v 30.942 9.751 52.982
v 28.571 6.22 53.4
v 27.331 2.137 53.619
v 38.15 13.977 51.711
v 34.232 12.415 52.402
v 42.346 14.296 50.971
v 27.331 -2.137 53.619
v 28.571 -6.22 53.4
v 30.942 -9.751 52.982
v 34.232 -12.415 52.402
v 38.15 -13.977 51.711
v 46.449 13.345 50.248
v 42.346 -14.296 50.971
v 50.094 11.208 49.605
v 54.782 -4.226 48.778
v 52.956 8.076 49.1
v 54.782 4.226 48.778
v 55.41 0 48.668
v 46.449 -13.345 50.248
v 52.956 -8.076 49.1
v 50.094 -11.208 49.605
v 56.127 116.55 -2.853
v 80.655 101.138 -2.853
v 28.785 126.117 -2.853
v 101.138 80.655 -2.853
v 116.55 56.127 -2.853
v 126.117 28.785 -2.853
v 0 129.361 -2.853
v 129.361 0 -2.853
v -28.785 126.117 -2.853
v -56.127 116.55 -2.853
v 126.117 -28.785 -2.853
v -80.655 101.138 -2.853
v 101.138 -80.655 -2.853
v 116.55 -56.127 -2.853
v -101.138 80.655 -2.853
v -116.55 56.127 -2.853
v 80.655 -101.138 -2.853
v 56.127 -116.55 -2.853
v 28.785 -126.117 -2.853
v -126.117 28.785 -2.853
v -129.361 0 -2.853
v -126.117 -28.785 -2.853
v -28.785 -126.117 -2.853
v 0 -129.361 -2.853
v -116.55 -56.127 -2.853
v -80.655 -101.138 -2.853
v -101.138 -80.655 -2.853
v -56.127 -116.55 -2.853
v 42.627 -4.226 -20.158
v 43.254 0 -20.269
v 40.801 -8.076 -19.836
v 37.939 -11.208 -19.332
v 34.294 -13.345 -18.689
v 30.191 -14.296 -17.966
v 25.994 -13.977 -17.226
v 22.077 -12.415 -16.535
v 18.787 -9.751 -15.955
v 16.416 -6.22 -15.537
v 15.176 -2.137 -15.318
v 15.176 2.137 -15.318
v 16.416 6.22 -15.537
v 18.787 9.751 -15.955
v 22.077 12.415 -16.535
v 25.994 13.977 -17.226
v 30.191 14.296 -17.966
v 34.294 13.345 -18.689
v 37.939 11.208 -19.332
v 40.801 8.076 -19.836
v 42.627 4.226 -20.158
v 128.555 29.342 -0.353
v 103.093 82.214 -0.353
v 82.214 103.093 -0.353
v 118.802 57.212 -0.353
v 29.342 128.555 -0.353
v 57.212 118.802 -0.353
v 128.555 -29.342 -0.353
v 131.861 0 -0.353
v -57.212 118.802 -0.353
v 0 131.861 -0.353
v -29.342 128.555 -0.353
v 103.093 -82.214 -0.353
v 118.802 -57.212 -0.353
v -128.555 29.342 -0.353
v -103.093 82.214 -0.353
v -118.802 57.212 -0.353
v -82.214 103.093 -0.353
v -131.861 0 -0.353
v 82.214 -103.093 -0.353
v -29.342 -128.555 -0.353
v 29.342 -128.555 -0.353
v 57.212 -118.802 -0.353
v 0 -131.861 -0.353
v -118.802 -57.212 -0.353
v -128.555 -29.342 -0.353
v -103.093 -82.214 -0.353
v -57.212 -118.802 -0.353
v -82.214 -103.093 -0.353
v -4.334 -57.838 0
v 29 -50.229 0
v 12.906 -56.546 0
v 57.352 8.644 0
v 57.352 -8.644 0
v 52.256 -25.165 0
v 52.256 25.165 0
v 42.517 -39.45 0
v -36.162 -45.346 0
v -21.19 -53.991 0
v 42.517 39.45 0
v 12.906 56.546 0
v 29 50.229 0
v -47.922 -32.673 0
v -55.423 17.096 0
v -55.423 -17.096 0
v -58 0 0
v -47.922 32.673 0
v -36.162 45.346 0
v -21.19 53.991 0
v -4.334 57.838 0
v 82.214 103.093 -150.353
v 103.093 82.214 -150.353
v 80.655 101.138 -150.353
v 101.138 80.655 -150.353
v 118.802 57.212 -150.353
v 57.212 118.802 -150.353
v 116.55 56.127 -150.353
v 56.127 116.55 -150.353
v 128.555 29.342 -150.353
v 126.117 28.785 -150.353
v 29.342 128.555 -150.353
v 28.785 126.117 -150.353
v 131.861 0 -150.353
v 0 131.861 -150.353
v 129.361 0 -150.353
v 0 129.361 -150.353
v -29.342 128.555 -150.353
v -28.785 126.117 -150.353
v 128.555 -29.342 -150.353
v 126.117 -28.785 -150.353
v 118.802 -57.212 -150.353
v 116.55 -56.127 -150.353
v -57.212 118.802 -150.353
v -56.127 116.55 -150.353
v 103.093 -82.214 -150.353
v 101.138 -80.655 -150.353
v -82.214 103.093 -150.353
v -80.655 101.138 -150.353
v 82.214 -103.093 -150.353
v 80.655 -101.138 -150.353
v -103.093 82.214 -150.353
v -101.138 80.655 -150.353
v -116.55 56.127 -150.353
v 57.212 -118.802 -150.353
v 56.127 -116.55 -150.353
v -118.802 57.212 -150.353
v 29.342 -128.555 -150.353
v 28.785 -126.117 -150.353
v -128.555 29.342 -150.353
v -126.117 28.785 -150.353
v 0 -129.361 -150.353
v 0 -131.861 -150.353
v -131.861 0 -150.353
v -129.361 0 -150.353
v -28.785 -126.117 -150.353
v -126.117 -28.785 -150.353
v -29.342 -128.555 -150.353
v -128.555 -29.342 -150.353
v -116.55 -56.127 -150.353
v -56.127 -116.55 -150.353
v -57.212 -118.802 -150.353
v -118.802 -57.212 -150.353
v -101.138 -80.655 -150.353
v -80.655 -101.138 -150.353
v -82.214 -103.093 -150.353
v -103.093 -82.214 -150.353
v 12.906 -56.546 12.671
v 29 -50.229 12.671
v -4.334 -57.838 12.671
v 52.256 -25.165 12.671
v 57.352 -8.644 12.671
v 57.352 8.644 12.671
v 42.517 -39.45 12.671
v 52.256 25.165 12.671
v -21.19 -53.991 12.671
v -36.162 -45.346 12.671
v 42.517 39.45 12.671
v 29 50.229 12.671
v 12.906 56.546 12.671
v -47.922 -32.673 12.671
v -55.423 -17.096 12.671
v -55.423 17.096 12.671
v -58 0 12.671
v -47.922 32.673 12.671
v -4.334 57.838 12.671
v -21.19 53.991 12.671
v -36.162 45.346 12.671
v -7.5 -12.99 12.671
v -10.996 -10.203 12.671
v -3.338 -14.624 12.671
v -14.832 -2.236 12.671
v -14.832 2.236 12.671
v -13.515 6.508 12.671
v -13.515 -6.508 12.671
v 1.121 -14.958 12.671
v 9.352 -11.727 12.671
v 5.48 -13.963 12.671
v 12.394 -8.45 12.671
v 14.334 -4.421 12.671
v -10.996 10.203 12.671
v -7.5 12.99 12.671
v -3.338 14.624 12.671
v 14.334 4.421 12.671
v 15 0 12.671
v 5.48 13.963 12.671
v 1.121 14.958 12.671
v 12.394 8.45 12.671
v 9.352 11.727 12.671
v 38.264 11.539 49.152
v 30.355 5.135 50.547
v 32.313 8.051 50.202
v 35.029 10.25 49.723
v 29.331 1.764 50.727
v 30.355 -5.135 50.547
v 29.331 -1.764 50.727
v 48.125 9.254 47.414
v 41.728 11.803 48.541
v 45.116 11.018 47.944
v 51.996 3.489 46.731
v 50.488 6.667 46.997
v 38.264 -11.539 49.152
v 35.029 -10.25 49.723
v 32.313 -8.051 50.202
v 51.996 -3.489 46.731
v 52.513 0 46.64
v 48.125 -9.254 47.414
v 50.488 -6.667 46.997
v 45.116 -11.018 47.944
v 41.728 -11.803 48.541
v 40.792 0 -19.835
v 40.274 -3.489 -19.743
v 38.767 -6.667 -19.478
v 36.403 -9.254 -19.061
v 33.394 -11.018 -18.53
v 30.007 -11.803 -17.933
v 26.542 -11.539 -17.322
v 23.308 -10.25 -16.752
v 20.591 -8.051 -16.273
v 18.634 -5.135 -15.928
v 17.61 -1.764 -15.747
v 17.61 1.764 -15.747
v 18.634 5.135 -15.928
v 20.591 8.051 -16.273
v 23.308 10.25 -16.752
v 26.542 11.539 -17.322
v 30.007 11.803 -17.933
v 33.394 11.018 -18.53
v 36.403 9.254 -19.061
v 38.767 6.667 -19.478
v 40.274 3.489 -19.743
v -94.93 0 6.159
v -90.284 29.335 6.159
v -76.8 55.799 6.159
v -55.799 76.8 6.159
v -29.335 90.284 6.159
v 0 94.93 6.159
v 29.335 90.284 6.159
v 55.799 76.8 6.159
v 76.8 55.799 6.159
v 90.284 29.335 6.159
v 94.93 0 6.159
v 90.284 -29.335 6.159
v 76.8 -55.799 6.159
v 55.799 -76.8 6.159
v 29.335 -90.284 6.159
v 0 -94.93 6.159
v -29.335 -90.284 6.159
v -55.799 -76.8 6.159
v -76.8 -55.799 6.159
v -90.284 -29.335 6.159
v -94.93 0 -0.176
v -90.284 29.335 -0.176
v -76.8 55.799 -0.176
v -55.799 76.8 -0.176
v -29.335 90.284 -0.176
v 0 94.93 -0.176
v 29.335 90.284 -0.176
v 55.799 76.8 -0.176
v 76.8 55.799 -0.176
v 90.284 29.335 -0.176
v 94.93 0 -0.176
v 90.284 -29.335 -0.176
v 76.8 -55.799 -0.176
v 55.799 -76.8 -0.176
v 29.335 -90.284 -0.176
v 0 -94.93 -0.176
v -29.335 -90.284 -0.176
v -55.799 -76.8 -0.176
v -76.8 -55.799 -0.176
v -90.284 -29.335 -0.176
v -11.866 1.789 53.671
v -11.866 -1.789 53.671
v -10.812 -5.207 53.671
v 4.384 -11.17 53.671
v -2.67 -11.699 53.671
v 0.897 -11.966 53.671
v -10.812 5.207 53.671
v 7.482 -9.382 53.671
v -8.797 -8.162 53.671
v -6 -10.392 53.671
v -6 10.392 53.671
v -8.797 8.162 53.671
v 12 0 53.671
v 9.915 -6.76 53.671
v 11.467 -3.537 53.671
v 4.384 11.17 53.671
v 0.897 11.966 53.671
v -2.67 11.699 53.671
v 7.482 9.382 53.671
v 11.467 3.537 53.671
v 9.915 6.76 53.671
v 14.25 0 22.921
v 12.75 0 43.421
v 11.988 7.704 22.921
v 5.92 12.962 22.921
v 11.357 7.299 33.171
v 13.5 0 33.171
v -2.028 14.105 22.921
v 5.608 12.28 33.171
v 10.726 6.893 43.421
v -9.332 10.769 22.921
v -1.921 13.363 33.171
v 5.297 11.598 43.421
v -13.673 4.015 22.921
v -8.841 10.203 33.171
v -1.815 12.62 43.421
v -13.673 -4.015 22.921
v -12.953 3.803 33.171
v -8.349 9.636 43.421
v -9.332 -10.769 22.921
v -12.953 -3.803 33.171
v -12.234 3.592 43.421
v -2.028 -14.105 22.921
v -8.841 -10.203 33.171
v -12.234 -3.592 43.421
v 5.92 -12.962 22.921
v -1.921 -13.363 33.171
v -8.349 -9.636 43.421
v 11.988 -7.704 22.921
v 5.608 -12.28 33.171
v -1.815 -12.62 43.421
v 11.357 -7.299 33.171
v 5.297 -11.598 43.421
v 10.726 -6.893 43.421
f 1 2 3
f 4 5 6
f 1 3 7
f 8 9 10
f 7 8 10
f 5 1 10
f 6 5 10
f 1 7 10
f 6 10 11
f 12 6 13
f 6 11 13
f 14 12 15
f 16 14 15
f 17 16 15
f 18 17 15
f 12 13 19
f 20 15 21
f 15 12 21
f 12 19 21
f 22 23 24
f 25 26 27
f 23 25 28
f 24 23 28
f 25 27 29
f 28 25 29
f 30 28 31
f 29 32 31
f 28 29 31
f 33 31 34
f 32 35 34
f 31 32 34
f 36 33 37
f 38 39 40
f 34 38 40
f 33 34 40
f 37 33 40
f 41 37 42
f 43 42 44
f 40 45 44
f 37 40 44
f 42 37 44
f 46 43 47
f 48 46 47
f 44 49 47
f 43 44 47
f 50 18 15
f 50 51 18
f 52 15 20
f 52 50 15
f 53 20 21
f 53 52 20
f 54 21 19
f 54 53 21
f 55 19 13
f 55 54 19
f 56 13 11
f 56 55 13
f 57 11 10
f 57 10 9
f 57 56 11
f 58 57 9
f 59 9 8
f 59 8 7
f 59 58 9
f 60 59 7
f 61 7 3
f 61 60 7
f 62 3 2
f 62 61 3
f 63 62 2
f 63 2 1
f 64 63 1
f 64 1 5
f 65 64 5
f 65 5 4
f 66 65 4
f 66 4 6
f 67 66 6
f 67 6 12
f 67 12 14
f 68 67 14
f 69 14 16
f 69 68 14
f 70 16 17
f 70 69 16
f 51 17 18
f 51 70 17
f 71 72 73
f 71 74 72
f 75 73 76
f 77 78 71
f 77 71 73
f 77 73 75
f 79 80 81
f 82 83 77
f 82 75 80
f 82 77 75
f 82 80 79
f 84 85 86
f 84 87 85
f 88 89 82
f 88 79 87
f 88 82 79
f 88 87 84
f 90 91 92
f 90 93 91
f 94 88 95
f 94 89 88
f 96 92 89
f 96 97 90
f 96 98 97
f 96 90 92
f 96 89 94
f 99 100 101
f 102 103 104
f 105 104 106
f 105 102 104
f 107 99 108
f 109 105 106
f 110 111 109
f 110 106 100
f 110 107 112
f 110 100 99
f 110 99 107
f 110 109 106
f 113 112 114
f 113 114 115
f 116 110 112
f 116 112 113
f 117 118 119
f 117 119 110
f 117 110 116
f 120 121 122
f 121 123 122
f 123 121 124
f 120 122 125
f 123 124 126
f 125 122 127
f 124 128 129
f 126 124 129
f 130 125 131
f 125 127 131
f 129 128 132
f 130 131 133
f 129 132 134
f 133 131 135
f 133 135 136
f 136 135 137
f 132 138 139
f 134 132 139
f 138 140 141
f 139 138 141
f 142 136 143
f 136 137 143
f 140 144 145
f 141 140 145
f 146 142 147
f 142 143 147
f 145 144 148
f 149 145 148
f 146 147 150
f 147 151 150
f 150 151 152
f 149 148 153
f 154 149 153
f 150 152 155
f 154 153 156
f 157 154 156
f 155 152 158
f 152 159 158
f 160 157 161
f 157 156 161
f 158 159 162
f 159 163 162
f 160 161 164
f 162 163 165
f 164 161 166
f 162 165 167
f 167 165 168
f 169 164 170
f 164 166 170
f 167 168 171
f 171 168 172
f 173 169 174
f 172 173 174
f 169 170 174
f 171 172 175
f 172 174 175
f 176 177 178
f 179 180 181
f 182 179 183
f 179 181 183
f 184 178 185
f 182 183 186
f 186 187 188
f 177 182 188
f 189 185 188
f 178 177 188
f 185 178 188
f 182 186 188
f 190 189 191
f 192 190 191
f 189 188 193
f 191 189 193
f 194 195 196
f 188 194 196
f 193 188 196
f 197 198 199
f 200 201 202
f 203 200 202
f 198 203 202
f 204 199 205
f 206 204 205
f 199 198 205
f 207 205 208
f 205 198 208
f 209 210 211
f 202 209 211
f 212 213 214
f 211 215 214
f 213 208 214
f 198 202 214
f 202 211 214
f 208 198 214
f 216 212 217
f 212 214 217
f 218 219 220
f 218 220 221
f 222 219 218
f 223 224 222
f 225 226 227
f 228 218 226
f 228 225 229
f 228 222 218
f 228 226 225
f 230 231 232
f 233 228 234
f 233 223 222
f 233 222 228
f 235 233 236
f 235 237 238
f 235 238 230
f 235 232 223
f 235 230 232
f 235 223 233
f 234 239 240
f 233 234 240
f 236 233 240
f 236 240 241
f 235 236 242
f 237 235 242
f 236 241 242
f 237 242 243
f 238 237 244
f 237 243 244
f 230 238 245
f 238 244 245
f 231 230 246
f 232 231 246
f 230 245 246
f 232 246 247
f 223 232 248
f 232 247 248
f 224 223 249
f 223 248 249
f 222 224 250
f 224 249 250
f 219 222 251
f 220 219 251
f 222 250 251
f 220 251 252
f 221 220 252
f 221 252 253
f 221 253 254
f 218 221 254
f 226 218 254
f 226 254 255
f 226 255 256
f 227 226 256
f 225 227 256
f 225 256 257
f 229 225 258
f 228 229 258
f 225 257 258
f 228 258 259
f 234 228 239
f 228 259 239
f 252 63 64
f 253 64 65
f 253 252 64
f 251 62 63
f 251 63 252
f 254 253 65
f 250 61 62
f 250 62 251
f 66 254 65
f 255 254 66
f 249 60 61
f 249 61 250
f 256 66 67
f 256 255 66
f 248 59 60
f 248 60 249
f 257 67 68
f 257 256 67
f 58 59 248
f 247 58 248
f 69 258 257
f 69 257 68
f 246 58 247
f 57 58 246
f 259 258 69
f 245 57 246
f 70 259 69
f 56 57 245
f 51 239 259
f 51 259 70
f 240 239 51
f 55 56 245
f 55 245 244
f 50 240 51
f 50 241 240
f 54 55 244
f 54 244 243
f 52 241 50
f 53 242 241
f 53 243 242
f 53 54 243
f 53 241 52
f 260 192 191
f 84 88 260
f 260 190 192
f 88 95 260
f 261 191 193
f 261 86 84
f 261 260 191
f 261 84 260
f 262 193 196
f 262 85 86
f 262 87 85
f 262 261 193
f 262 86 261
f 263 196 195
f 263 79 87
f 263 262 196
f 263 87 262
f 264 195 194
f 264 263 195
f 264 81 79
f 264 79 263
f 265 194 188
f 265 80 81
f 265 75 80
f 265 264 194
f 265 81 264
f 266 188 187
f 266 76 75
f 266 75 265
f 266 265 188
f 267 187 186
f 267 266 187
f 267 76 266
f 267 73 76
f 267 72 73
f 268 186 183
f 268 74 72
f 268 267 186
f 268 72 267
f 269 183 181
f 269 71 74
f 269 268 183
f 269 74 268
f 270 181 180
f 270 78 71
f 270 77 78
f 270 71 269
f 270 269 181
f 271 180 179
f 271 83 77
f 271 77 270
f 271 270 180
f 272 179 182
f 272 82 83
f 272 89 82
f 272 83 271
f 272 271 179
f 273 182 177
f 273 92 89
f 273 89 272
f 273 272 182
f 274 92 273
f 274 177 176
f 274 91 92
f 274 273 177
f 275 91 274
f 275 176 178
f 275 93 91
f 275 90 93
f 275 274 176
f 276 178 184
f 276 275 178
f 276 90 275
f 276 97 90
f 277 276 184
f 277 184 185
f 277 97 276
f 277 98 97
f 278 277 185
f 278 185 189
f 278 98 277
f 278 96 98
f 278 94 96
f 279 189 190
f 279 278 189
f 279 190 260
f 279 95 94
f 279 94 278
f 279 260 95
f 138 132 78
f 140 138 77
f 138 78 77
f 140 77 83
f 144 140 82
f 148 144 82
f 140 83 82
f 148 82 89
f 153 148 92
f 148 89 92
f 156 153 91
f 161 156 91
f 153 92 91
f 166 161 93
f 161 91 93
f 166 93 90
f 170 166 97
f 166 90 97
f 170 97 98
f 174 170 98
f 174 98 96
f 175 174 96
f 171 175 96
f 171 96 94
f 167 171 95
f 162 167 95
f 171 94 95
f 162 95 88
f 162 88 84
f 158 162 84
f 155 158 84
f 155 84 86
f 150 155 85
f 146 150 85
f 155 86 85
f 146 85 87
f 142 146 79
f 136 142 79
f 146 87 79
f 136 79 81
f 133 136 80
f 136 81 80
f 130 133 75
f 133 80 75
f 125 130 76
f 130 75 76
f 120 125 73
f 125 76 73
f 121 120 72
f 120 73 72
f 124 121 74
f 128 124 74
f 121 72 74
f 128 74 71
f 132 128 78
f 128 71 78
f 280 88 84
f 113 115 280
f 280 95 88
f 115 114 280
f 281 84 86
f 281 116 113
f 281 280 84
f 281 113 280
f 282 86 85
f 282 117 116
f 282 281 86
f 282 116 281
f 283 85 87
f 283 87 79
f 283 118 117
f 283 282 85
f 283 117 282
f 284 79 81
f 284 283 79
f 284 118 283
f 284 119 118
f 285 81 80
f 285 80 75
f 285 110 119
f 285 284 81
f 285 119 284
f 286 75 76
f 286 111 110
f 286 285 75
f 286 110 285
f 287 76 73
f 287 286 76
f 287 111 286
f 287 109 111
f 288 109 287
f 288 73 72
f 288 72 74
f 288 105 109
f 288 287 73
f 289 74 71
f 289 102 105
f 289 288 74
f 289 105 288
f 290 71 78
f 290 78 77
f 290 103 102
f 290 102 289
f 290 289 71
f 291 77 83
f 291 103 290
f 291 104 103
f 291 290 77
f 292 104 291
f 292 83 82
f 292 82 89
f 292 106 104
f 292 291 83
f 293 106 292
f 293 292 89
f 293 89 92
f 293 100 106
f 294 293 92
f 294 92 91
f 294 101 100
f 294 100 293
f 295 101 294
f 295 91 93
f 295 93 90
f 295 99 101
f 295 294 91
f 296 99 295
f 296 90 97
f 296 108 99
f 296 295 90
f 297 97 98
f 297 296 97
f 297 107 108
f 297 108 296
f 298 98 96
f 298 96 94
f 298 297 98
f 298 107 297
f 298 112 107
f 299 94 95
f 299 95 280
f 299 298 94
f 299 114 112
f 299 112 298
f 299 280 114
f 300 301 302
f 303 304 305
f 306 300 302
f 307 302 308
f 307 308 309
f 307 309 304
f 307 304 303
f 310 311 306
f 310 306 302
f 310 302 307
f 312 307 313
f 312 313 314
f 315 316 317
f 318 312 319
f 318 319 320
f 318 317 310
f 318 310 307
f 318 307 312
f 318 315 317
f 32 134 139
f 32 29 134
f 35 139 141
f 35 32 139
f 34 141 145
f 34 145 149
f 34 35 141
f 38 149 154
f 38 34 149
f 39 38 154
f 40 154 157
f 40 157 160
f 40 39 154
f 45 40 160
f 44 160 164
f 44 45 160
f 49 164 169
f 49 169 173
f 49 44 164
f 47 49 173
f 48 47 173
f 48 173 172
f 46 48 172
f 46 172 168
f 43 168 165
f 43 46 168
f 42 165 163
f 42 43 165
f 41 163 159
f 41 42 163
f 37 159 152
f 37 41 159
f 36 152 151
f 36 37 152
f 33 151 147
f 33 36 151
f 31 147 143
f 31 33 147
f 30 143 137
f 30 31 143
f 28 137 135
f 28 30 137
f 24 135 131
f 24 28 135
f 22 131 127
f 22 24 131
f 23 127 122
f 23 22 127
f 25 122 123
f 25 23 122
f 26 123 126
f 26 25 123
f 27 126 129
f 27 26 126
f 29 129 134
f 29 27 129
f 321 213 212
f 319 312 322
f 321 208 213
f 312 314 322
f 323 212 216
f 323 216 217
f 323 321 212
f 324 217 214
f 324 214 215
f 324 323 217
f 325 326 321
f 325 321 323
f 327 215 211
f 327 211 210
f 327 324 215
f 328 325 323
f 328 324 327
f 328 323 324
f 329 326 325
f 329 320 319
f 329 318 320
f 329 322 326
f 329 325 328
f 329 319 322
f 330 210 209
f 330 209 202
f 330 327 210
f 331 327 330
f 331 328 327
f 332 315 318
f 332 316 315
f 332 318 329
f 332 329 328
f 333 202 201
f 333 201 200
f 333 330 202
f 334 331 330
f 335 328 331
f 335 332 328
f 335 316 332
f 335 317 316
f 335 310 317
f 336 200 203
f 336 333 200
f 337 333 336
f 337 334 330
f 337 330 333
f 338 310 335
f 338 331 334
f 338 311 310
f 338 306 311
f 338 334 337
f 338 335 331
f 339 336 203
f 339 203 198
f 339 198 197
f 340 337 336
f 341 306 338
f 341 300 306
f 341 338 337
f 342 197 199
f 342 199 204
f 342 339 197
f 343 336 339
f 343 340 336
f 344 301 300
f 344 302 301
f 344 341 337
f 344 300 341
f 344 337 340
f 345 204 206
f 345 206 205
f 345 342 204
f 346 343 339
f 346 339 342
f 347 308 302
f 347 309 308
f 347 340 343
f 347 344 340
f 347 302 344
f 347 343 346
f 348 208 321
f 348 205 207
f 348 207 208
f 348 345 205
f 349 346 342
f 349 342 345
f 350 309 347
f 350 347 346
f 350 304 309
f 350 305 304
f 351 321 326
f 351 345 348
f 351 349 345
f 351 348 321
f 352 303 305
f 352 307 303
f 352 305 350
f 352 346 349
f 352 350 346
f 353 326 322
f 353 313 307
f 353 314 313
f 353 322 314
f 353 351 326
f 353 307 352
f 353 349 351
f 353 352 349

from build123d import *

# Parameters (mm, degrees)
F0_W      = 131.8605814759
F0_H      = 150
F2_W      = 58
F2_H      = 12.6709589615
F5_R      = 15
F7_R      = 12
F10_R     = 14.335969035
F11_DEPTH = 35
F12_T     = -2.5
F13_T     = -2.5


with BuildPart() as f1:
    # F0 (on Front) → F1 (revolve)
    with BuildSketch(Plane.XZ):
        with Locations((65.930290738, -75.3526543635)):
            Rectangle(F0_W, F0_H)
    revolve(axis=Axis((0, 0, -75.1763271818), (0, 0, -1)))

    # F12
    f12_openings = [f1.faces().sort_by_distance(p)[0] for p in [
        (0, 0, -150.352654),
    ]]
    offset(amount=F12_T, openings=f12_openings)


with BuildPart() as f4:
    # F2 (on Front) → F4 (revolve)
    with BuildSketch(Plane.XZ):
        Polygon((-58, 0), (-58, 12.6709589615), (-131.8605814759, -0.3526543635), align=None)
        with Locations((-29, 6.3354794807)):
            Rectangle(F2_W, F2_H)
    revolve(axis=Axis((0, 0, 31.8354794807), (0, 0, -1)))


with BuildPart() as f8:
    # F5 (on plane+point) → F8 section 0
    with BuildSketch(Plane.XY.offset(12.6709589615)):
        Circle(F5_R)
    # F7 (on offset) → F8 section 1
    with BuildSketch(Plane.XY.offset(53.6709589615)):
        Circle(F7_R)
    loft()


with BuildPart() as f11:
    # F10 (on face) → F11 (new body, symmetric)
    with BuildSketch(Plane(origin=(3.9157755973, 0, 22.2074669544), x_dir=(0.984807753, 0, -0.1736481777), z_dir=(-0.1736481777, 0, -0.984807753))):
        with Locations((31.7807346582, 0)):
            Circle(F10_R)
    extrude(amount=F11_DEPTH, both=True)

    # F13
    f13_openings = [f11.faces().sort_by_distance(p)[0] for p in [
        (29.136003, 0, -17.779471),
    ]]
    offset(amount=F13_T, openings=f13_openings)


solid = Compound([f1.part, f4.part, f8.part, f11.part])
